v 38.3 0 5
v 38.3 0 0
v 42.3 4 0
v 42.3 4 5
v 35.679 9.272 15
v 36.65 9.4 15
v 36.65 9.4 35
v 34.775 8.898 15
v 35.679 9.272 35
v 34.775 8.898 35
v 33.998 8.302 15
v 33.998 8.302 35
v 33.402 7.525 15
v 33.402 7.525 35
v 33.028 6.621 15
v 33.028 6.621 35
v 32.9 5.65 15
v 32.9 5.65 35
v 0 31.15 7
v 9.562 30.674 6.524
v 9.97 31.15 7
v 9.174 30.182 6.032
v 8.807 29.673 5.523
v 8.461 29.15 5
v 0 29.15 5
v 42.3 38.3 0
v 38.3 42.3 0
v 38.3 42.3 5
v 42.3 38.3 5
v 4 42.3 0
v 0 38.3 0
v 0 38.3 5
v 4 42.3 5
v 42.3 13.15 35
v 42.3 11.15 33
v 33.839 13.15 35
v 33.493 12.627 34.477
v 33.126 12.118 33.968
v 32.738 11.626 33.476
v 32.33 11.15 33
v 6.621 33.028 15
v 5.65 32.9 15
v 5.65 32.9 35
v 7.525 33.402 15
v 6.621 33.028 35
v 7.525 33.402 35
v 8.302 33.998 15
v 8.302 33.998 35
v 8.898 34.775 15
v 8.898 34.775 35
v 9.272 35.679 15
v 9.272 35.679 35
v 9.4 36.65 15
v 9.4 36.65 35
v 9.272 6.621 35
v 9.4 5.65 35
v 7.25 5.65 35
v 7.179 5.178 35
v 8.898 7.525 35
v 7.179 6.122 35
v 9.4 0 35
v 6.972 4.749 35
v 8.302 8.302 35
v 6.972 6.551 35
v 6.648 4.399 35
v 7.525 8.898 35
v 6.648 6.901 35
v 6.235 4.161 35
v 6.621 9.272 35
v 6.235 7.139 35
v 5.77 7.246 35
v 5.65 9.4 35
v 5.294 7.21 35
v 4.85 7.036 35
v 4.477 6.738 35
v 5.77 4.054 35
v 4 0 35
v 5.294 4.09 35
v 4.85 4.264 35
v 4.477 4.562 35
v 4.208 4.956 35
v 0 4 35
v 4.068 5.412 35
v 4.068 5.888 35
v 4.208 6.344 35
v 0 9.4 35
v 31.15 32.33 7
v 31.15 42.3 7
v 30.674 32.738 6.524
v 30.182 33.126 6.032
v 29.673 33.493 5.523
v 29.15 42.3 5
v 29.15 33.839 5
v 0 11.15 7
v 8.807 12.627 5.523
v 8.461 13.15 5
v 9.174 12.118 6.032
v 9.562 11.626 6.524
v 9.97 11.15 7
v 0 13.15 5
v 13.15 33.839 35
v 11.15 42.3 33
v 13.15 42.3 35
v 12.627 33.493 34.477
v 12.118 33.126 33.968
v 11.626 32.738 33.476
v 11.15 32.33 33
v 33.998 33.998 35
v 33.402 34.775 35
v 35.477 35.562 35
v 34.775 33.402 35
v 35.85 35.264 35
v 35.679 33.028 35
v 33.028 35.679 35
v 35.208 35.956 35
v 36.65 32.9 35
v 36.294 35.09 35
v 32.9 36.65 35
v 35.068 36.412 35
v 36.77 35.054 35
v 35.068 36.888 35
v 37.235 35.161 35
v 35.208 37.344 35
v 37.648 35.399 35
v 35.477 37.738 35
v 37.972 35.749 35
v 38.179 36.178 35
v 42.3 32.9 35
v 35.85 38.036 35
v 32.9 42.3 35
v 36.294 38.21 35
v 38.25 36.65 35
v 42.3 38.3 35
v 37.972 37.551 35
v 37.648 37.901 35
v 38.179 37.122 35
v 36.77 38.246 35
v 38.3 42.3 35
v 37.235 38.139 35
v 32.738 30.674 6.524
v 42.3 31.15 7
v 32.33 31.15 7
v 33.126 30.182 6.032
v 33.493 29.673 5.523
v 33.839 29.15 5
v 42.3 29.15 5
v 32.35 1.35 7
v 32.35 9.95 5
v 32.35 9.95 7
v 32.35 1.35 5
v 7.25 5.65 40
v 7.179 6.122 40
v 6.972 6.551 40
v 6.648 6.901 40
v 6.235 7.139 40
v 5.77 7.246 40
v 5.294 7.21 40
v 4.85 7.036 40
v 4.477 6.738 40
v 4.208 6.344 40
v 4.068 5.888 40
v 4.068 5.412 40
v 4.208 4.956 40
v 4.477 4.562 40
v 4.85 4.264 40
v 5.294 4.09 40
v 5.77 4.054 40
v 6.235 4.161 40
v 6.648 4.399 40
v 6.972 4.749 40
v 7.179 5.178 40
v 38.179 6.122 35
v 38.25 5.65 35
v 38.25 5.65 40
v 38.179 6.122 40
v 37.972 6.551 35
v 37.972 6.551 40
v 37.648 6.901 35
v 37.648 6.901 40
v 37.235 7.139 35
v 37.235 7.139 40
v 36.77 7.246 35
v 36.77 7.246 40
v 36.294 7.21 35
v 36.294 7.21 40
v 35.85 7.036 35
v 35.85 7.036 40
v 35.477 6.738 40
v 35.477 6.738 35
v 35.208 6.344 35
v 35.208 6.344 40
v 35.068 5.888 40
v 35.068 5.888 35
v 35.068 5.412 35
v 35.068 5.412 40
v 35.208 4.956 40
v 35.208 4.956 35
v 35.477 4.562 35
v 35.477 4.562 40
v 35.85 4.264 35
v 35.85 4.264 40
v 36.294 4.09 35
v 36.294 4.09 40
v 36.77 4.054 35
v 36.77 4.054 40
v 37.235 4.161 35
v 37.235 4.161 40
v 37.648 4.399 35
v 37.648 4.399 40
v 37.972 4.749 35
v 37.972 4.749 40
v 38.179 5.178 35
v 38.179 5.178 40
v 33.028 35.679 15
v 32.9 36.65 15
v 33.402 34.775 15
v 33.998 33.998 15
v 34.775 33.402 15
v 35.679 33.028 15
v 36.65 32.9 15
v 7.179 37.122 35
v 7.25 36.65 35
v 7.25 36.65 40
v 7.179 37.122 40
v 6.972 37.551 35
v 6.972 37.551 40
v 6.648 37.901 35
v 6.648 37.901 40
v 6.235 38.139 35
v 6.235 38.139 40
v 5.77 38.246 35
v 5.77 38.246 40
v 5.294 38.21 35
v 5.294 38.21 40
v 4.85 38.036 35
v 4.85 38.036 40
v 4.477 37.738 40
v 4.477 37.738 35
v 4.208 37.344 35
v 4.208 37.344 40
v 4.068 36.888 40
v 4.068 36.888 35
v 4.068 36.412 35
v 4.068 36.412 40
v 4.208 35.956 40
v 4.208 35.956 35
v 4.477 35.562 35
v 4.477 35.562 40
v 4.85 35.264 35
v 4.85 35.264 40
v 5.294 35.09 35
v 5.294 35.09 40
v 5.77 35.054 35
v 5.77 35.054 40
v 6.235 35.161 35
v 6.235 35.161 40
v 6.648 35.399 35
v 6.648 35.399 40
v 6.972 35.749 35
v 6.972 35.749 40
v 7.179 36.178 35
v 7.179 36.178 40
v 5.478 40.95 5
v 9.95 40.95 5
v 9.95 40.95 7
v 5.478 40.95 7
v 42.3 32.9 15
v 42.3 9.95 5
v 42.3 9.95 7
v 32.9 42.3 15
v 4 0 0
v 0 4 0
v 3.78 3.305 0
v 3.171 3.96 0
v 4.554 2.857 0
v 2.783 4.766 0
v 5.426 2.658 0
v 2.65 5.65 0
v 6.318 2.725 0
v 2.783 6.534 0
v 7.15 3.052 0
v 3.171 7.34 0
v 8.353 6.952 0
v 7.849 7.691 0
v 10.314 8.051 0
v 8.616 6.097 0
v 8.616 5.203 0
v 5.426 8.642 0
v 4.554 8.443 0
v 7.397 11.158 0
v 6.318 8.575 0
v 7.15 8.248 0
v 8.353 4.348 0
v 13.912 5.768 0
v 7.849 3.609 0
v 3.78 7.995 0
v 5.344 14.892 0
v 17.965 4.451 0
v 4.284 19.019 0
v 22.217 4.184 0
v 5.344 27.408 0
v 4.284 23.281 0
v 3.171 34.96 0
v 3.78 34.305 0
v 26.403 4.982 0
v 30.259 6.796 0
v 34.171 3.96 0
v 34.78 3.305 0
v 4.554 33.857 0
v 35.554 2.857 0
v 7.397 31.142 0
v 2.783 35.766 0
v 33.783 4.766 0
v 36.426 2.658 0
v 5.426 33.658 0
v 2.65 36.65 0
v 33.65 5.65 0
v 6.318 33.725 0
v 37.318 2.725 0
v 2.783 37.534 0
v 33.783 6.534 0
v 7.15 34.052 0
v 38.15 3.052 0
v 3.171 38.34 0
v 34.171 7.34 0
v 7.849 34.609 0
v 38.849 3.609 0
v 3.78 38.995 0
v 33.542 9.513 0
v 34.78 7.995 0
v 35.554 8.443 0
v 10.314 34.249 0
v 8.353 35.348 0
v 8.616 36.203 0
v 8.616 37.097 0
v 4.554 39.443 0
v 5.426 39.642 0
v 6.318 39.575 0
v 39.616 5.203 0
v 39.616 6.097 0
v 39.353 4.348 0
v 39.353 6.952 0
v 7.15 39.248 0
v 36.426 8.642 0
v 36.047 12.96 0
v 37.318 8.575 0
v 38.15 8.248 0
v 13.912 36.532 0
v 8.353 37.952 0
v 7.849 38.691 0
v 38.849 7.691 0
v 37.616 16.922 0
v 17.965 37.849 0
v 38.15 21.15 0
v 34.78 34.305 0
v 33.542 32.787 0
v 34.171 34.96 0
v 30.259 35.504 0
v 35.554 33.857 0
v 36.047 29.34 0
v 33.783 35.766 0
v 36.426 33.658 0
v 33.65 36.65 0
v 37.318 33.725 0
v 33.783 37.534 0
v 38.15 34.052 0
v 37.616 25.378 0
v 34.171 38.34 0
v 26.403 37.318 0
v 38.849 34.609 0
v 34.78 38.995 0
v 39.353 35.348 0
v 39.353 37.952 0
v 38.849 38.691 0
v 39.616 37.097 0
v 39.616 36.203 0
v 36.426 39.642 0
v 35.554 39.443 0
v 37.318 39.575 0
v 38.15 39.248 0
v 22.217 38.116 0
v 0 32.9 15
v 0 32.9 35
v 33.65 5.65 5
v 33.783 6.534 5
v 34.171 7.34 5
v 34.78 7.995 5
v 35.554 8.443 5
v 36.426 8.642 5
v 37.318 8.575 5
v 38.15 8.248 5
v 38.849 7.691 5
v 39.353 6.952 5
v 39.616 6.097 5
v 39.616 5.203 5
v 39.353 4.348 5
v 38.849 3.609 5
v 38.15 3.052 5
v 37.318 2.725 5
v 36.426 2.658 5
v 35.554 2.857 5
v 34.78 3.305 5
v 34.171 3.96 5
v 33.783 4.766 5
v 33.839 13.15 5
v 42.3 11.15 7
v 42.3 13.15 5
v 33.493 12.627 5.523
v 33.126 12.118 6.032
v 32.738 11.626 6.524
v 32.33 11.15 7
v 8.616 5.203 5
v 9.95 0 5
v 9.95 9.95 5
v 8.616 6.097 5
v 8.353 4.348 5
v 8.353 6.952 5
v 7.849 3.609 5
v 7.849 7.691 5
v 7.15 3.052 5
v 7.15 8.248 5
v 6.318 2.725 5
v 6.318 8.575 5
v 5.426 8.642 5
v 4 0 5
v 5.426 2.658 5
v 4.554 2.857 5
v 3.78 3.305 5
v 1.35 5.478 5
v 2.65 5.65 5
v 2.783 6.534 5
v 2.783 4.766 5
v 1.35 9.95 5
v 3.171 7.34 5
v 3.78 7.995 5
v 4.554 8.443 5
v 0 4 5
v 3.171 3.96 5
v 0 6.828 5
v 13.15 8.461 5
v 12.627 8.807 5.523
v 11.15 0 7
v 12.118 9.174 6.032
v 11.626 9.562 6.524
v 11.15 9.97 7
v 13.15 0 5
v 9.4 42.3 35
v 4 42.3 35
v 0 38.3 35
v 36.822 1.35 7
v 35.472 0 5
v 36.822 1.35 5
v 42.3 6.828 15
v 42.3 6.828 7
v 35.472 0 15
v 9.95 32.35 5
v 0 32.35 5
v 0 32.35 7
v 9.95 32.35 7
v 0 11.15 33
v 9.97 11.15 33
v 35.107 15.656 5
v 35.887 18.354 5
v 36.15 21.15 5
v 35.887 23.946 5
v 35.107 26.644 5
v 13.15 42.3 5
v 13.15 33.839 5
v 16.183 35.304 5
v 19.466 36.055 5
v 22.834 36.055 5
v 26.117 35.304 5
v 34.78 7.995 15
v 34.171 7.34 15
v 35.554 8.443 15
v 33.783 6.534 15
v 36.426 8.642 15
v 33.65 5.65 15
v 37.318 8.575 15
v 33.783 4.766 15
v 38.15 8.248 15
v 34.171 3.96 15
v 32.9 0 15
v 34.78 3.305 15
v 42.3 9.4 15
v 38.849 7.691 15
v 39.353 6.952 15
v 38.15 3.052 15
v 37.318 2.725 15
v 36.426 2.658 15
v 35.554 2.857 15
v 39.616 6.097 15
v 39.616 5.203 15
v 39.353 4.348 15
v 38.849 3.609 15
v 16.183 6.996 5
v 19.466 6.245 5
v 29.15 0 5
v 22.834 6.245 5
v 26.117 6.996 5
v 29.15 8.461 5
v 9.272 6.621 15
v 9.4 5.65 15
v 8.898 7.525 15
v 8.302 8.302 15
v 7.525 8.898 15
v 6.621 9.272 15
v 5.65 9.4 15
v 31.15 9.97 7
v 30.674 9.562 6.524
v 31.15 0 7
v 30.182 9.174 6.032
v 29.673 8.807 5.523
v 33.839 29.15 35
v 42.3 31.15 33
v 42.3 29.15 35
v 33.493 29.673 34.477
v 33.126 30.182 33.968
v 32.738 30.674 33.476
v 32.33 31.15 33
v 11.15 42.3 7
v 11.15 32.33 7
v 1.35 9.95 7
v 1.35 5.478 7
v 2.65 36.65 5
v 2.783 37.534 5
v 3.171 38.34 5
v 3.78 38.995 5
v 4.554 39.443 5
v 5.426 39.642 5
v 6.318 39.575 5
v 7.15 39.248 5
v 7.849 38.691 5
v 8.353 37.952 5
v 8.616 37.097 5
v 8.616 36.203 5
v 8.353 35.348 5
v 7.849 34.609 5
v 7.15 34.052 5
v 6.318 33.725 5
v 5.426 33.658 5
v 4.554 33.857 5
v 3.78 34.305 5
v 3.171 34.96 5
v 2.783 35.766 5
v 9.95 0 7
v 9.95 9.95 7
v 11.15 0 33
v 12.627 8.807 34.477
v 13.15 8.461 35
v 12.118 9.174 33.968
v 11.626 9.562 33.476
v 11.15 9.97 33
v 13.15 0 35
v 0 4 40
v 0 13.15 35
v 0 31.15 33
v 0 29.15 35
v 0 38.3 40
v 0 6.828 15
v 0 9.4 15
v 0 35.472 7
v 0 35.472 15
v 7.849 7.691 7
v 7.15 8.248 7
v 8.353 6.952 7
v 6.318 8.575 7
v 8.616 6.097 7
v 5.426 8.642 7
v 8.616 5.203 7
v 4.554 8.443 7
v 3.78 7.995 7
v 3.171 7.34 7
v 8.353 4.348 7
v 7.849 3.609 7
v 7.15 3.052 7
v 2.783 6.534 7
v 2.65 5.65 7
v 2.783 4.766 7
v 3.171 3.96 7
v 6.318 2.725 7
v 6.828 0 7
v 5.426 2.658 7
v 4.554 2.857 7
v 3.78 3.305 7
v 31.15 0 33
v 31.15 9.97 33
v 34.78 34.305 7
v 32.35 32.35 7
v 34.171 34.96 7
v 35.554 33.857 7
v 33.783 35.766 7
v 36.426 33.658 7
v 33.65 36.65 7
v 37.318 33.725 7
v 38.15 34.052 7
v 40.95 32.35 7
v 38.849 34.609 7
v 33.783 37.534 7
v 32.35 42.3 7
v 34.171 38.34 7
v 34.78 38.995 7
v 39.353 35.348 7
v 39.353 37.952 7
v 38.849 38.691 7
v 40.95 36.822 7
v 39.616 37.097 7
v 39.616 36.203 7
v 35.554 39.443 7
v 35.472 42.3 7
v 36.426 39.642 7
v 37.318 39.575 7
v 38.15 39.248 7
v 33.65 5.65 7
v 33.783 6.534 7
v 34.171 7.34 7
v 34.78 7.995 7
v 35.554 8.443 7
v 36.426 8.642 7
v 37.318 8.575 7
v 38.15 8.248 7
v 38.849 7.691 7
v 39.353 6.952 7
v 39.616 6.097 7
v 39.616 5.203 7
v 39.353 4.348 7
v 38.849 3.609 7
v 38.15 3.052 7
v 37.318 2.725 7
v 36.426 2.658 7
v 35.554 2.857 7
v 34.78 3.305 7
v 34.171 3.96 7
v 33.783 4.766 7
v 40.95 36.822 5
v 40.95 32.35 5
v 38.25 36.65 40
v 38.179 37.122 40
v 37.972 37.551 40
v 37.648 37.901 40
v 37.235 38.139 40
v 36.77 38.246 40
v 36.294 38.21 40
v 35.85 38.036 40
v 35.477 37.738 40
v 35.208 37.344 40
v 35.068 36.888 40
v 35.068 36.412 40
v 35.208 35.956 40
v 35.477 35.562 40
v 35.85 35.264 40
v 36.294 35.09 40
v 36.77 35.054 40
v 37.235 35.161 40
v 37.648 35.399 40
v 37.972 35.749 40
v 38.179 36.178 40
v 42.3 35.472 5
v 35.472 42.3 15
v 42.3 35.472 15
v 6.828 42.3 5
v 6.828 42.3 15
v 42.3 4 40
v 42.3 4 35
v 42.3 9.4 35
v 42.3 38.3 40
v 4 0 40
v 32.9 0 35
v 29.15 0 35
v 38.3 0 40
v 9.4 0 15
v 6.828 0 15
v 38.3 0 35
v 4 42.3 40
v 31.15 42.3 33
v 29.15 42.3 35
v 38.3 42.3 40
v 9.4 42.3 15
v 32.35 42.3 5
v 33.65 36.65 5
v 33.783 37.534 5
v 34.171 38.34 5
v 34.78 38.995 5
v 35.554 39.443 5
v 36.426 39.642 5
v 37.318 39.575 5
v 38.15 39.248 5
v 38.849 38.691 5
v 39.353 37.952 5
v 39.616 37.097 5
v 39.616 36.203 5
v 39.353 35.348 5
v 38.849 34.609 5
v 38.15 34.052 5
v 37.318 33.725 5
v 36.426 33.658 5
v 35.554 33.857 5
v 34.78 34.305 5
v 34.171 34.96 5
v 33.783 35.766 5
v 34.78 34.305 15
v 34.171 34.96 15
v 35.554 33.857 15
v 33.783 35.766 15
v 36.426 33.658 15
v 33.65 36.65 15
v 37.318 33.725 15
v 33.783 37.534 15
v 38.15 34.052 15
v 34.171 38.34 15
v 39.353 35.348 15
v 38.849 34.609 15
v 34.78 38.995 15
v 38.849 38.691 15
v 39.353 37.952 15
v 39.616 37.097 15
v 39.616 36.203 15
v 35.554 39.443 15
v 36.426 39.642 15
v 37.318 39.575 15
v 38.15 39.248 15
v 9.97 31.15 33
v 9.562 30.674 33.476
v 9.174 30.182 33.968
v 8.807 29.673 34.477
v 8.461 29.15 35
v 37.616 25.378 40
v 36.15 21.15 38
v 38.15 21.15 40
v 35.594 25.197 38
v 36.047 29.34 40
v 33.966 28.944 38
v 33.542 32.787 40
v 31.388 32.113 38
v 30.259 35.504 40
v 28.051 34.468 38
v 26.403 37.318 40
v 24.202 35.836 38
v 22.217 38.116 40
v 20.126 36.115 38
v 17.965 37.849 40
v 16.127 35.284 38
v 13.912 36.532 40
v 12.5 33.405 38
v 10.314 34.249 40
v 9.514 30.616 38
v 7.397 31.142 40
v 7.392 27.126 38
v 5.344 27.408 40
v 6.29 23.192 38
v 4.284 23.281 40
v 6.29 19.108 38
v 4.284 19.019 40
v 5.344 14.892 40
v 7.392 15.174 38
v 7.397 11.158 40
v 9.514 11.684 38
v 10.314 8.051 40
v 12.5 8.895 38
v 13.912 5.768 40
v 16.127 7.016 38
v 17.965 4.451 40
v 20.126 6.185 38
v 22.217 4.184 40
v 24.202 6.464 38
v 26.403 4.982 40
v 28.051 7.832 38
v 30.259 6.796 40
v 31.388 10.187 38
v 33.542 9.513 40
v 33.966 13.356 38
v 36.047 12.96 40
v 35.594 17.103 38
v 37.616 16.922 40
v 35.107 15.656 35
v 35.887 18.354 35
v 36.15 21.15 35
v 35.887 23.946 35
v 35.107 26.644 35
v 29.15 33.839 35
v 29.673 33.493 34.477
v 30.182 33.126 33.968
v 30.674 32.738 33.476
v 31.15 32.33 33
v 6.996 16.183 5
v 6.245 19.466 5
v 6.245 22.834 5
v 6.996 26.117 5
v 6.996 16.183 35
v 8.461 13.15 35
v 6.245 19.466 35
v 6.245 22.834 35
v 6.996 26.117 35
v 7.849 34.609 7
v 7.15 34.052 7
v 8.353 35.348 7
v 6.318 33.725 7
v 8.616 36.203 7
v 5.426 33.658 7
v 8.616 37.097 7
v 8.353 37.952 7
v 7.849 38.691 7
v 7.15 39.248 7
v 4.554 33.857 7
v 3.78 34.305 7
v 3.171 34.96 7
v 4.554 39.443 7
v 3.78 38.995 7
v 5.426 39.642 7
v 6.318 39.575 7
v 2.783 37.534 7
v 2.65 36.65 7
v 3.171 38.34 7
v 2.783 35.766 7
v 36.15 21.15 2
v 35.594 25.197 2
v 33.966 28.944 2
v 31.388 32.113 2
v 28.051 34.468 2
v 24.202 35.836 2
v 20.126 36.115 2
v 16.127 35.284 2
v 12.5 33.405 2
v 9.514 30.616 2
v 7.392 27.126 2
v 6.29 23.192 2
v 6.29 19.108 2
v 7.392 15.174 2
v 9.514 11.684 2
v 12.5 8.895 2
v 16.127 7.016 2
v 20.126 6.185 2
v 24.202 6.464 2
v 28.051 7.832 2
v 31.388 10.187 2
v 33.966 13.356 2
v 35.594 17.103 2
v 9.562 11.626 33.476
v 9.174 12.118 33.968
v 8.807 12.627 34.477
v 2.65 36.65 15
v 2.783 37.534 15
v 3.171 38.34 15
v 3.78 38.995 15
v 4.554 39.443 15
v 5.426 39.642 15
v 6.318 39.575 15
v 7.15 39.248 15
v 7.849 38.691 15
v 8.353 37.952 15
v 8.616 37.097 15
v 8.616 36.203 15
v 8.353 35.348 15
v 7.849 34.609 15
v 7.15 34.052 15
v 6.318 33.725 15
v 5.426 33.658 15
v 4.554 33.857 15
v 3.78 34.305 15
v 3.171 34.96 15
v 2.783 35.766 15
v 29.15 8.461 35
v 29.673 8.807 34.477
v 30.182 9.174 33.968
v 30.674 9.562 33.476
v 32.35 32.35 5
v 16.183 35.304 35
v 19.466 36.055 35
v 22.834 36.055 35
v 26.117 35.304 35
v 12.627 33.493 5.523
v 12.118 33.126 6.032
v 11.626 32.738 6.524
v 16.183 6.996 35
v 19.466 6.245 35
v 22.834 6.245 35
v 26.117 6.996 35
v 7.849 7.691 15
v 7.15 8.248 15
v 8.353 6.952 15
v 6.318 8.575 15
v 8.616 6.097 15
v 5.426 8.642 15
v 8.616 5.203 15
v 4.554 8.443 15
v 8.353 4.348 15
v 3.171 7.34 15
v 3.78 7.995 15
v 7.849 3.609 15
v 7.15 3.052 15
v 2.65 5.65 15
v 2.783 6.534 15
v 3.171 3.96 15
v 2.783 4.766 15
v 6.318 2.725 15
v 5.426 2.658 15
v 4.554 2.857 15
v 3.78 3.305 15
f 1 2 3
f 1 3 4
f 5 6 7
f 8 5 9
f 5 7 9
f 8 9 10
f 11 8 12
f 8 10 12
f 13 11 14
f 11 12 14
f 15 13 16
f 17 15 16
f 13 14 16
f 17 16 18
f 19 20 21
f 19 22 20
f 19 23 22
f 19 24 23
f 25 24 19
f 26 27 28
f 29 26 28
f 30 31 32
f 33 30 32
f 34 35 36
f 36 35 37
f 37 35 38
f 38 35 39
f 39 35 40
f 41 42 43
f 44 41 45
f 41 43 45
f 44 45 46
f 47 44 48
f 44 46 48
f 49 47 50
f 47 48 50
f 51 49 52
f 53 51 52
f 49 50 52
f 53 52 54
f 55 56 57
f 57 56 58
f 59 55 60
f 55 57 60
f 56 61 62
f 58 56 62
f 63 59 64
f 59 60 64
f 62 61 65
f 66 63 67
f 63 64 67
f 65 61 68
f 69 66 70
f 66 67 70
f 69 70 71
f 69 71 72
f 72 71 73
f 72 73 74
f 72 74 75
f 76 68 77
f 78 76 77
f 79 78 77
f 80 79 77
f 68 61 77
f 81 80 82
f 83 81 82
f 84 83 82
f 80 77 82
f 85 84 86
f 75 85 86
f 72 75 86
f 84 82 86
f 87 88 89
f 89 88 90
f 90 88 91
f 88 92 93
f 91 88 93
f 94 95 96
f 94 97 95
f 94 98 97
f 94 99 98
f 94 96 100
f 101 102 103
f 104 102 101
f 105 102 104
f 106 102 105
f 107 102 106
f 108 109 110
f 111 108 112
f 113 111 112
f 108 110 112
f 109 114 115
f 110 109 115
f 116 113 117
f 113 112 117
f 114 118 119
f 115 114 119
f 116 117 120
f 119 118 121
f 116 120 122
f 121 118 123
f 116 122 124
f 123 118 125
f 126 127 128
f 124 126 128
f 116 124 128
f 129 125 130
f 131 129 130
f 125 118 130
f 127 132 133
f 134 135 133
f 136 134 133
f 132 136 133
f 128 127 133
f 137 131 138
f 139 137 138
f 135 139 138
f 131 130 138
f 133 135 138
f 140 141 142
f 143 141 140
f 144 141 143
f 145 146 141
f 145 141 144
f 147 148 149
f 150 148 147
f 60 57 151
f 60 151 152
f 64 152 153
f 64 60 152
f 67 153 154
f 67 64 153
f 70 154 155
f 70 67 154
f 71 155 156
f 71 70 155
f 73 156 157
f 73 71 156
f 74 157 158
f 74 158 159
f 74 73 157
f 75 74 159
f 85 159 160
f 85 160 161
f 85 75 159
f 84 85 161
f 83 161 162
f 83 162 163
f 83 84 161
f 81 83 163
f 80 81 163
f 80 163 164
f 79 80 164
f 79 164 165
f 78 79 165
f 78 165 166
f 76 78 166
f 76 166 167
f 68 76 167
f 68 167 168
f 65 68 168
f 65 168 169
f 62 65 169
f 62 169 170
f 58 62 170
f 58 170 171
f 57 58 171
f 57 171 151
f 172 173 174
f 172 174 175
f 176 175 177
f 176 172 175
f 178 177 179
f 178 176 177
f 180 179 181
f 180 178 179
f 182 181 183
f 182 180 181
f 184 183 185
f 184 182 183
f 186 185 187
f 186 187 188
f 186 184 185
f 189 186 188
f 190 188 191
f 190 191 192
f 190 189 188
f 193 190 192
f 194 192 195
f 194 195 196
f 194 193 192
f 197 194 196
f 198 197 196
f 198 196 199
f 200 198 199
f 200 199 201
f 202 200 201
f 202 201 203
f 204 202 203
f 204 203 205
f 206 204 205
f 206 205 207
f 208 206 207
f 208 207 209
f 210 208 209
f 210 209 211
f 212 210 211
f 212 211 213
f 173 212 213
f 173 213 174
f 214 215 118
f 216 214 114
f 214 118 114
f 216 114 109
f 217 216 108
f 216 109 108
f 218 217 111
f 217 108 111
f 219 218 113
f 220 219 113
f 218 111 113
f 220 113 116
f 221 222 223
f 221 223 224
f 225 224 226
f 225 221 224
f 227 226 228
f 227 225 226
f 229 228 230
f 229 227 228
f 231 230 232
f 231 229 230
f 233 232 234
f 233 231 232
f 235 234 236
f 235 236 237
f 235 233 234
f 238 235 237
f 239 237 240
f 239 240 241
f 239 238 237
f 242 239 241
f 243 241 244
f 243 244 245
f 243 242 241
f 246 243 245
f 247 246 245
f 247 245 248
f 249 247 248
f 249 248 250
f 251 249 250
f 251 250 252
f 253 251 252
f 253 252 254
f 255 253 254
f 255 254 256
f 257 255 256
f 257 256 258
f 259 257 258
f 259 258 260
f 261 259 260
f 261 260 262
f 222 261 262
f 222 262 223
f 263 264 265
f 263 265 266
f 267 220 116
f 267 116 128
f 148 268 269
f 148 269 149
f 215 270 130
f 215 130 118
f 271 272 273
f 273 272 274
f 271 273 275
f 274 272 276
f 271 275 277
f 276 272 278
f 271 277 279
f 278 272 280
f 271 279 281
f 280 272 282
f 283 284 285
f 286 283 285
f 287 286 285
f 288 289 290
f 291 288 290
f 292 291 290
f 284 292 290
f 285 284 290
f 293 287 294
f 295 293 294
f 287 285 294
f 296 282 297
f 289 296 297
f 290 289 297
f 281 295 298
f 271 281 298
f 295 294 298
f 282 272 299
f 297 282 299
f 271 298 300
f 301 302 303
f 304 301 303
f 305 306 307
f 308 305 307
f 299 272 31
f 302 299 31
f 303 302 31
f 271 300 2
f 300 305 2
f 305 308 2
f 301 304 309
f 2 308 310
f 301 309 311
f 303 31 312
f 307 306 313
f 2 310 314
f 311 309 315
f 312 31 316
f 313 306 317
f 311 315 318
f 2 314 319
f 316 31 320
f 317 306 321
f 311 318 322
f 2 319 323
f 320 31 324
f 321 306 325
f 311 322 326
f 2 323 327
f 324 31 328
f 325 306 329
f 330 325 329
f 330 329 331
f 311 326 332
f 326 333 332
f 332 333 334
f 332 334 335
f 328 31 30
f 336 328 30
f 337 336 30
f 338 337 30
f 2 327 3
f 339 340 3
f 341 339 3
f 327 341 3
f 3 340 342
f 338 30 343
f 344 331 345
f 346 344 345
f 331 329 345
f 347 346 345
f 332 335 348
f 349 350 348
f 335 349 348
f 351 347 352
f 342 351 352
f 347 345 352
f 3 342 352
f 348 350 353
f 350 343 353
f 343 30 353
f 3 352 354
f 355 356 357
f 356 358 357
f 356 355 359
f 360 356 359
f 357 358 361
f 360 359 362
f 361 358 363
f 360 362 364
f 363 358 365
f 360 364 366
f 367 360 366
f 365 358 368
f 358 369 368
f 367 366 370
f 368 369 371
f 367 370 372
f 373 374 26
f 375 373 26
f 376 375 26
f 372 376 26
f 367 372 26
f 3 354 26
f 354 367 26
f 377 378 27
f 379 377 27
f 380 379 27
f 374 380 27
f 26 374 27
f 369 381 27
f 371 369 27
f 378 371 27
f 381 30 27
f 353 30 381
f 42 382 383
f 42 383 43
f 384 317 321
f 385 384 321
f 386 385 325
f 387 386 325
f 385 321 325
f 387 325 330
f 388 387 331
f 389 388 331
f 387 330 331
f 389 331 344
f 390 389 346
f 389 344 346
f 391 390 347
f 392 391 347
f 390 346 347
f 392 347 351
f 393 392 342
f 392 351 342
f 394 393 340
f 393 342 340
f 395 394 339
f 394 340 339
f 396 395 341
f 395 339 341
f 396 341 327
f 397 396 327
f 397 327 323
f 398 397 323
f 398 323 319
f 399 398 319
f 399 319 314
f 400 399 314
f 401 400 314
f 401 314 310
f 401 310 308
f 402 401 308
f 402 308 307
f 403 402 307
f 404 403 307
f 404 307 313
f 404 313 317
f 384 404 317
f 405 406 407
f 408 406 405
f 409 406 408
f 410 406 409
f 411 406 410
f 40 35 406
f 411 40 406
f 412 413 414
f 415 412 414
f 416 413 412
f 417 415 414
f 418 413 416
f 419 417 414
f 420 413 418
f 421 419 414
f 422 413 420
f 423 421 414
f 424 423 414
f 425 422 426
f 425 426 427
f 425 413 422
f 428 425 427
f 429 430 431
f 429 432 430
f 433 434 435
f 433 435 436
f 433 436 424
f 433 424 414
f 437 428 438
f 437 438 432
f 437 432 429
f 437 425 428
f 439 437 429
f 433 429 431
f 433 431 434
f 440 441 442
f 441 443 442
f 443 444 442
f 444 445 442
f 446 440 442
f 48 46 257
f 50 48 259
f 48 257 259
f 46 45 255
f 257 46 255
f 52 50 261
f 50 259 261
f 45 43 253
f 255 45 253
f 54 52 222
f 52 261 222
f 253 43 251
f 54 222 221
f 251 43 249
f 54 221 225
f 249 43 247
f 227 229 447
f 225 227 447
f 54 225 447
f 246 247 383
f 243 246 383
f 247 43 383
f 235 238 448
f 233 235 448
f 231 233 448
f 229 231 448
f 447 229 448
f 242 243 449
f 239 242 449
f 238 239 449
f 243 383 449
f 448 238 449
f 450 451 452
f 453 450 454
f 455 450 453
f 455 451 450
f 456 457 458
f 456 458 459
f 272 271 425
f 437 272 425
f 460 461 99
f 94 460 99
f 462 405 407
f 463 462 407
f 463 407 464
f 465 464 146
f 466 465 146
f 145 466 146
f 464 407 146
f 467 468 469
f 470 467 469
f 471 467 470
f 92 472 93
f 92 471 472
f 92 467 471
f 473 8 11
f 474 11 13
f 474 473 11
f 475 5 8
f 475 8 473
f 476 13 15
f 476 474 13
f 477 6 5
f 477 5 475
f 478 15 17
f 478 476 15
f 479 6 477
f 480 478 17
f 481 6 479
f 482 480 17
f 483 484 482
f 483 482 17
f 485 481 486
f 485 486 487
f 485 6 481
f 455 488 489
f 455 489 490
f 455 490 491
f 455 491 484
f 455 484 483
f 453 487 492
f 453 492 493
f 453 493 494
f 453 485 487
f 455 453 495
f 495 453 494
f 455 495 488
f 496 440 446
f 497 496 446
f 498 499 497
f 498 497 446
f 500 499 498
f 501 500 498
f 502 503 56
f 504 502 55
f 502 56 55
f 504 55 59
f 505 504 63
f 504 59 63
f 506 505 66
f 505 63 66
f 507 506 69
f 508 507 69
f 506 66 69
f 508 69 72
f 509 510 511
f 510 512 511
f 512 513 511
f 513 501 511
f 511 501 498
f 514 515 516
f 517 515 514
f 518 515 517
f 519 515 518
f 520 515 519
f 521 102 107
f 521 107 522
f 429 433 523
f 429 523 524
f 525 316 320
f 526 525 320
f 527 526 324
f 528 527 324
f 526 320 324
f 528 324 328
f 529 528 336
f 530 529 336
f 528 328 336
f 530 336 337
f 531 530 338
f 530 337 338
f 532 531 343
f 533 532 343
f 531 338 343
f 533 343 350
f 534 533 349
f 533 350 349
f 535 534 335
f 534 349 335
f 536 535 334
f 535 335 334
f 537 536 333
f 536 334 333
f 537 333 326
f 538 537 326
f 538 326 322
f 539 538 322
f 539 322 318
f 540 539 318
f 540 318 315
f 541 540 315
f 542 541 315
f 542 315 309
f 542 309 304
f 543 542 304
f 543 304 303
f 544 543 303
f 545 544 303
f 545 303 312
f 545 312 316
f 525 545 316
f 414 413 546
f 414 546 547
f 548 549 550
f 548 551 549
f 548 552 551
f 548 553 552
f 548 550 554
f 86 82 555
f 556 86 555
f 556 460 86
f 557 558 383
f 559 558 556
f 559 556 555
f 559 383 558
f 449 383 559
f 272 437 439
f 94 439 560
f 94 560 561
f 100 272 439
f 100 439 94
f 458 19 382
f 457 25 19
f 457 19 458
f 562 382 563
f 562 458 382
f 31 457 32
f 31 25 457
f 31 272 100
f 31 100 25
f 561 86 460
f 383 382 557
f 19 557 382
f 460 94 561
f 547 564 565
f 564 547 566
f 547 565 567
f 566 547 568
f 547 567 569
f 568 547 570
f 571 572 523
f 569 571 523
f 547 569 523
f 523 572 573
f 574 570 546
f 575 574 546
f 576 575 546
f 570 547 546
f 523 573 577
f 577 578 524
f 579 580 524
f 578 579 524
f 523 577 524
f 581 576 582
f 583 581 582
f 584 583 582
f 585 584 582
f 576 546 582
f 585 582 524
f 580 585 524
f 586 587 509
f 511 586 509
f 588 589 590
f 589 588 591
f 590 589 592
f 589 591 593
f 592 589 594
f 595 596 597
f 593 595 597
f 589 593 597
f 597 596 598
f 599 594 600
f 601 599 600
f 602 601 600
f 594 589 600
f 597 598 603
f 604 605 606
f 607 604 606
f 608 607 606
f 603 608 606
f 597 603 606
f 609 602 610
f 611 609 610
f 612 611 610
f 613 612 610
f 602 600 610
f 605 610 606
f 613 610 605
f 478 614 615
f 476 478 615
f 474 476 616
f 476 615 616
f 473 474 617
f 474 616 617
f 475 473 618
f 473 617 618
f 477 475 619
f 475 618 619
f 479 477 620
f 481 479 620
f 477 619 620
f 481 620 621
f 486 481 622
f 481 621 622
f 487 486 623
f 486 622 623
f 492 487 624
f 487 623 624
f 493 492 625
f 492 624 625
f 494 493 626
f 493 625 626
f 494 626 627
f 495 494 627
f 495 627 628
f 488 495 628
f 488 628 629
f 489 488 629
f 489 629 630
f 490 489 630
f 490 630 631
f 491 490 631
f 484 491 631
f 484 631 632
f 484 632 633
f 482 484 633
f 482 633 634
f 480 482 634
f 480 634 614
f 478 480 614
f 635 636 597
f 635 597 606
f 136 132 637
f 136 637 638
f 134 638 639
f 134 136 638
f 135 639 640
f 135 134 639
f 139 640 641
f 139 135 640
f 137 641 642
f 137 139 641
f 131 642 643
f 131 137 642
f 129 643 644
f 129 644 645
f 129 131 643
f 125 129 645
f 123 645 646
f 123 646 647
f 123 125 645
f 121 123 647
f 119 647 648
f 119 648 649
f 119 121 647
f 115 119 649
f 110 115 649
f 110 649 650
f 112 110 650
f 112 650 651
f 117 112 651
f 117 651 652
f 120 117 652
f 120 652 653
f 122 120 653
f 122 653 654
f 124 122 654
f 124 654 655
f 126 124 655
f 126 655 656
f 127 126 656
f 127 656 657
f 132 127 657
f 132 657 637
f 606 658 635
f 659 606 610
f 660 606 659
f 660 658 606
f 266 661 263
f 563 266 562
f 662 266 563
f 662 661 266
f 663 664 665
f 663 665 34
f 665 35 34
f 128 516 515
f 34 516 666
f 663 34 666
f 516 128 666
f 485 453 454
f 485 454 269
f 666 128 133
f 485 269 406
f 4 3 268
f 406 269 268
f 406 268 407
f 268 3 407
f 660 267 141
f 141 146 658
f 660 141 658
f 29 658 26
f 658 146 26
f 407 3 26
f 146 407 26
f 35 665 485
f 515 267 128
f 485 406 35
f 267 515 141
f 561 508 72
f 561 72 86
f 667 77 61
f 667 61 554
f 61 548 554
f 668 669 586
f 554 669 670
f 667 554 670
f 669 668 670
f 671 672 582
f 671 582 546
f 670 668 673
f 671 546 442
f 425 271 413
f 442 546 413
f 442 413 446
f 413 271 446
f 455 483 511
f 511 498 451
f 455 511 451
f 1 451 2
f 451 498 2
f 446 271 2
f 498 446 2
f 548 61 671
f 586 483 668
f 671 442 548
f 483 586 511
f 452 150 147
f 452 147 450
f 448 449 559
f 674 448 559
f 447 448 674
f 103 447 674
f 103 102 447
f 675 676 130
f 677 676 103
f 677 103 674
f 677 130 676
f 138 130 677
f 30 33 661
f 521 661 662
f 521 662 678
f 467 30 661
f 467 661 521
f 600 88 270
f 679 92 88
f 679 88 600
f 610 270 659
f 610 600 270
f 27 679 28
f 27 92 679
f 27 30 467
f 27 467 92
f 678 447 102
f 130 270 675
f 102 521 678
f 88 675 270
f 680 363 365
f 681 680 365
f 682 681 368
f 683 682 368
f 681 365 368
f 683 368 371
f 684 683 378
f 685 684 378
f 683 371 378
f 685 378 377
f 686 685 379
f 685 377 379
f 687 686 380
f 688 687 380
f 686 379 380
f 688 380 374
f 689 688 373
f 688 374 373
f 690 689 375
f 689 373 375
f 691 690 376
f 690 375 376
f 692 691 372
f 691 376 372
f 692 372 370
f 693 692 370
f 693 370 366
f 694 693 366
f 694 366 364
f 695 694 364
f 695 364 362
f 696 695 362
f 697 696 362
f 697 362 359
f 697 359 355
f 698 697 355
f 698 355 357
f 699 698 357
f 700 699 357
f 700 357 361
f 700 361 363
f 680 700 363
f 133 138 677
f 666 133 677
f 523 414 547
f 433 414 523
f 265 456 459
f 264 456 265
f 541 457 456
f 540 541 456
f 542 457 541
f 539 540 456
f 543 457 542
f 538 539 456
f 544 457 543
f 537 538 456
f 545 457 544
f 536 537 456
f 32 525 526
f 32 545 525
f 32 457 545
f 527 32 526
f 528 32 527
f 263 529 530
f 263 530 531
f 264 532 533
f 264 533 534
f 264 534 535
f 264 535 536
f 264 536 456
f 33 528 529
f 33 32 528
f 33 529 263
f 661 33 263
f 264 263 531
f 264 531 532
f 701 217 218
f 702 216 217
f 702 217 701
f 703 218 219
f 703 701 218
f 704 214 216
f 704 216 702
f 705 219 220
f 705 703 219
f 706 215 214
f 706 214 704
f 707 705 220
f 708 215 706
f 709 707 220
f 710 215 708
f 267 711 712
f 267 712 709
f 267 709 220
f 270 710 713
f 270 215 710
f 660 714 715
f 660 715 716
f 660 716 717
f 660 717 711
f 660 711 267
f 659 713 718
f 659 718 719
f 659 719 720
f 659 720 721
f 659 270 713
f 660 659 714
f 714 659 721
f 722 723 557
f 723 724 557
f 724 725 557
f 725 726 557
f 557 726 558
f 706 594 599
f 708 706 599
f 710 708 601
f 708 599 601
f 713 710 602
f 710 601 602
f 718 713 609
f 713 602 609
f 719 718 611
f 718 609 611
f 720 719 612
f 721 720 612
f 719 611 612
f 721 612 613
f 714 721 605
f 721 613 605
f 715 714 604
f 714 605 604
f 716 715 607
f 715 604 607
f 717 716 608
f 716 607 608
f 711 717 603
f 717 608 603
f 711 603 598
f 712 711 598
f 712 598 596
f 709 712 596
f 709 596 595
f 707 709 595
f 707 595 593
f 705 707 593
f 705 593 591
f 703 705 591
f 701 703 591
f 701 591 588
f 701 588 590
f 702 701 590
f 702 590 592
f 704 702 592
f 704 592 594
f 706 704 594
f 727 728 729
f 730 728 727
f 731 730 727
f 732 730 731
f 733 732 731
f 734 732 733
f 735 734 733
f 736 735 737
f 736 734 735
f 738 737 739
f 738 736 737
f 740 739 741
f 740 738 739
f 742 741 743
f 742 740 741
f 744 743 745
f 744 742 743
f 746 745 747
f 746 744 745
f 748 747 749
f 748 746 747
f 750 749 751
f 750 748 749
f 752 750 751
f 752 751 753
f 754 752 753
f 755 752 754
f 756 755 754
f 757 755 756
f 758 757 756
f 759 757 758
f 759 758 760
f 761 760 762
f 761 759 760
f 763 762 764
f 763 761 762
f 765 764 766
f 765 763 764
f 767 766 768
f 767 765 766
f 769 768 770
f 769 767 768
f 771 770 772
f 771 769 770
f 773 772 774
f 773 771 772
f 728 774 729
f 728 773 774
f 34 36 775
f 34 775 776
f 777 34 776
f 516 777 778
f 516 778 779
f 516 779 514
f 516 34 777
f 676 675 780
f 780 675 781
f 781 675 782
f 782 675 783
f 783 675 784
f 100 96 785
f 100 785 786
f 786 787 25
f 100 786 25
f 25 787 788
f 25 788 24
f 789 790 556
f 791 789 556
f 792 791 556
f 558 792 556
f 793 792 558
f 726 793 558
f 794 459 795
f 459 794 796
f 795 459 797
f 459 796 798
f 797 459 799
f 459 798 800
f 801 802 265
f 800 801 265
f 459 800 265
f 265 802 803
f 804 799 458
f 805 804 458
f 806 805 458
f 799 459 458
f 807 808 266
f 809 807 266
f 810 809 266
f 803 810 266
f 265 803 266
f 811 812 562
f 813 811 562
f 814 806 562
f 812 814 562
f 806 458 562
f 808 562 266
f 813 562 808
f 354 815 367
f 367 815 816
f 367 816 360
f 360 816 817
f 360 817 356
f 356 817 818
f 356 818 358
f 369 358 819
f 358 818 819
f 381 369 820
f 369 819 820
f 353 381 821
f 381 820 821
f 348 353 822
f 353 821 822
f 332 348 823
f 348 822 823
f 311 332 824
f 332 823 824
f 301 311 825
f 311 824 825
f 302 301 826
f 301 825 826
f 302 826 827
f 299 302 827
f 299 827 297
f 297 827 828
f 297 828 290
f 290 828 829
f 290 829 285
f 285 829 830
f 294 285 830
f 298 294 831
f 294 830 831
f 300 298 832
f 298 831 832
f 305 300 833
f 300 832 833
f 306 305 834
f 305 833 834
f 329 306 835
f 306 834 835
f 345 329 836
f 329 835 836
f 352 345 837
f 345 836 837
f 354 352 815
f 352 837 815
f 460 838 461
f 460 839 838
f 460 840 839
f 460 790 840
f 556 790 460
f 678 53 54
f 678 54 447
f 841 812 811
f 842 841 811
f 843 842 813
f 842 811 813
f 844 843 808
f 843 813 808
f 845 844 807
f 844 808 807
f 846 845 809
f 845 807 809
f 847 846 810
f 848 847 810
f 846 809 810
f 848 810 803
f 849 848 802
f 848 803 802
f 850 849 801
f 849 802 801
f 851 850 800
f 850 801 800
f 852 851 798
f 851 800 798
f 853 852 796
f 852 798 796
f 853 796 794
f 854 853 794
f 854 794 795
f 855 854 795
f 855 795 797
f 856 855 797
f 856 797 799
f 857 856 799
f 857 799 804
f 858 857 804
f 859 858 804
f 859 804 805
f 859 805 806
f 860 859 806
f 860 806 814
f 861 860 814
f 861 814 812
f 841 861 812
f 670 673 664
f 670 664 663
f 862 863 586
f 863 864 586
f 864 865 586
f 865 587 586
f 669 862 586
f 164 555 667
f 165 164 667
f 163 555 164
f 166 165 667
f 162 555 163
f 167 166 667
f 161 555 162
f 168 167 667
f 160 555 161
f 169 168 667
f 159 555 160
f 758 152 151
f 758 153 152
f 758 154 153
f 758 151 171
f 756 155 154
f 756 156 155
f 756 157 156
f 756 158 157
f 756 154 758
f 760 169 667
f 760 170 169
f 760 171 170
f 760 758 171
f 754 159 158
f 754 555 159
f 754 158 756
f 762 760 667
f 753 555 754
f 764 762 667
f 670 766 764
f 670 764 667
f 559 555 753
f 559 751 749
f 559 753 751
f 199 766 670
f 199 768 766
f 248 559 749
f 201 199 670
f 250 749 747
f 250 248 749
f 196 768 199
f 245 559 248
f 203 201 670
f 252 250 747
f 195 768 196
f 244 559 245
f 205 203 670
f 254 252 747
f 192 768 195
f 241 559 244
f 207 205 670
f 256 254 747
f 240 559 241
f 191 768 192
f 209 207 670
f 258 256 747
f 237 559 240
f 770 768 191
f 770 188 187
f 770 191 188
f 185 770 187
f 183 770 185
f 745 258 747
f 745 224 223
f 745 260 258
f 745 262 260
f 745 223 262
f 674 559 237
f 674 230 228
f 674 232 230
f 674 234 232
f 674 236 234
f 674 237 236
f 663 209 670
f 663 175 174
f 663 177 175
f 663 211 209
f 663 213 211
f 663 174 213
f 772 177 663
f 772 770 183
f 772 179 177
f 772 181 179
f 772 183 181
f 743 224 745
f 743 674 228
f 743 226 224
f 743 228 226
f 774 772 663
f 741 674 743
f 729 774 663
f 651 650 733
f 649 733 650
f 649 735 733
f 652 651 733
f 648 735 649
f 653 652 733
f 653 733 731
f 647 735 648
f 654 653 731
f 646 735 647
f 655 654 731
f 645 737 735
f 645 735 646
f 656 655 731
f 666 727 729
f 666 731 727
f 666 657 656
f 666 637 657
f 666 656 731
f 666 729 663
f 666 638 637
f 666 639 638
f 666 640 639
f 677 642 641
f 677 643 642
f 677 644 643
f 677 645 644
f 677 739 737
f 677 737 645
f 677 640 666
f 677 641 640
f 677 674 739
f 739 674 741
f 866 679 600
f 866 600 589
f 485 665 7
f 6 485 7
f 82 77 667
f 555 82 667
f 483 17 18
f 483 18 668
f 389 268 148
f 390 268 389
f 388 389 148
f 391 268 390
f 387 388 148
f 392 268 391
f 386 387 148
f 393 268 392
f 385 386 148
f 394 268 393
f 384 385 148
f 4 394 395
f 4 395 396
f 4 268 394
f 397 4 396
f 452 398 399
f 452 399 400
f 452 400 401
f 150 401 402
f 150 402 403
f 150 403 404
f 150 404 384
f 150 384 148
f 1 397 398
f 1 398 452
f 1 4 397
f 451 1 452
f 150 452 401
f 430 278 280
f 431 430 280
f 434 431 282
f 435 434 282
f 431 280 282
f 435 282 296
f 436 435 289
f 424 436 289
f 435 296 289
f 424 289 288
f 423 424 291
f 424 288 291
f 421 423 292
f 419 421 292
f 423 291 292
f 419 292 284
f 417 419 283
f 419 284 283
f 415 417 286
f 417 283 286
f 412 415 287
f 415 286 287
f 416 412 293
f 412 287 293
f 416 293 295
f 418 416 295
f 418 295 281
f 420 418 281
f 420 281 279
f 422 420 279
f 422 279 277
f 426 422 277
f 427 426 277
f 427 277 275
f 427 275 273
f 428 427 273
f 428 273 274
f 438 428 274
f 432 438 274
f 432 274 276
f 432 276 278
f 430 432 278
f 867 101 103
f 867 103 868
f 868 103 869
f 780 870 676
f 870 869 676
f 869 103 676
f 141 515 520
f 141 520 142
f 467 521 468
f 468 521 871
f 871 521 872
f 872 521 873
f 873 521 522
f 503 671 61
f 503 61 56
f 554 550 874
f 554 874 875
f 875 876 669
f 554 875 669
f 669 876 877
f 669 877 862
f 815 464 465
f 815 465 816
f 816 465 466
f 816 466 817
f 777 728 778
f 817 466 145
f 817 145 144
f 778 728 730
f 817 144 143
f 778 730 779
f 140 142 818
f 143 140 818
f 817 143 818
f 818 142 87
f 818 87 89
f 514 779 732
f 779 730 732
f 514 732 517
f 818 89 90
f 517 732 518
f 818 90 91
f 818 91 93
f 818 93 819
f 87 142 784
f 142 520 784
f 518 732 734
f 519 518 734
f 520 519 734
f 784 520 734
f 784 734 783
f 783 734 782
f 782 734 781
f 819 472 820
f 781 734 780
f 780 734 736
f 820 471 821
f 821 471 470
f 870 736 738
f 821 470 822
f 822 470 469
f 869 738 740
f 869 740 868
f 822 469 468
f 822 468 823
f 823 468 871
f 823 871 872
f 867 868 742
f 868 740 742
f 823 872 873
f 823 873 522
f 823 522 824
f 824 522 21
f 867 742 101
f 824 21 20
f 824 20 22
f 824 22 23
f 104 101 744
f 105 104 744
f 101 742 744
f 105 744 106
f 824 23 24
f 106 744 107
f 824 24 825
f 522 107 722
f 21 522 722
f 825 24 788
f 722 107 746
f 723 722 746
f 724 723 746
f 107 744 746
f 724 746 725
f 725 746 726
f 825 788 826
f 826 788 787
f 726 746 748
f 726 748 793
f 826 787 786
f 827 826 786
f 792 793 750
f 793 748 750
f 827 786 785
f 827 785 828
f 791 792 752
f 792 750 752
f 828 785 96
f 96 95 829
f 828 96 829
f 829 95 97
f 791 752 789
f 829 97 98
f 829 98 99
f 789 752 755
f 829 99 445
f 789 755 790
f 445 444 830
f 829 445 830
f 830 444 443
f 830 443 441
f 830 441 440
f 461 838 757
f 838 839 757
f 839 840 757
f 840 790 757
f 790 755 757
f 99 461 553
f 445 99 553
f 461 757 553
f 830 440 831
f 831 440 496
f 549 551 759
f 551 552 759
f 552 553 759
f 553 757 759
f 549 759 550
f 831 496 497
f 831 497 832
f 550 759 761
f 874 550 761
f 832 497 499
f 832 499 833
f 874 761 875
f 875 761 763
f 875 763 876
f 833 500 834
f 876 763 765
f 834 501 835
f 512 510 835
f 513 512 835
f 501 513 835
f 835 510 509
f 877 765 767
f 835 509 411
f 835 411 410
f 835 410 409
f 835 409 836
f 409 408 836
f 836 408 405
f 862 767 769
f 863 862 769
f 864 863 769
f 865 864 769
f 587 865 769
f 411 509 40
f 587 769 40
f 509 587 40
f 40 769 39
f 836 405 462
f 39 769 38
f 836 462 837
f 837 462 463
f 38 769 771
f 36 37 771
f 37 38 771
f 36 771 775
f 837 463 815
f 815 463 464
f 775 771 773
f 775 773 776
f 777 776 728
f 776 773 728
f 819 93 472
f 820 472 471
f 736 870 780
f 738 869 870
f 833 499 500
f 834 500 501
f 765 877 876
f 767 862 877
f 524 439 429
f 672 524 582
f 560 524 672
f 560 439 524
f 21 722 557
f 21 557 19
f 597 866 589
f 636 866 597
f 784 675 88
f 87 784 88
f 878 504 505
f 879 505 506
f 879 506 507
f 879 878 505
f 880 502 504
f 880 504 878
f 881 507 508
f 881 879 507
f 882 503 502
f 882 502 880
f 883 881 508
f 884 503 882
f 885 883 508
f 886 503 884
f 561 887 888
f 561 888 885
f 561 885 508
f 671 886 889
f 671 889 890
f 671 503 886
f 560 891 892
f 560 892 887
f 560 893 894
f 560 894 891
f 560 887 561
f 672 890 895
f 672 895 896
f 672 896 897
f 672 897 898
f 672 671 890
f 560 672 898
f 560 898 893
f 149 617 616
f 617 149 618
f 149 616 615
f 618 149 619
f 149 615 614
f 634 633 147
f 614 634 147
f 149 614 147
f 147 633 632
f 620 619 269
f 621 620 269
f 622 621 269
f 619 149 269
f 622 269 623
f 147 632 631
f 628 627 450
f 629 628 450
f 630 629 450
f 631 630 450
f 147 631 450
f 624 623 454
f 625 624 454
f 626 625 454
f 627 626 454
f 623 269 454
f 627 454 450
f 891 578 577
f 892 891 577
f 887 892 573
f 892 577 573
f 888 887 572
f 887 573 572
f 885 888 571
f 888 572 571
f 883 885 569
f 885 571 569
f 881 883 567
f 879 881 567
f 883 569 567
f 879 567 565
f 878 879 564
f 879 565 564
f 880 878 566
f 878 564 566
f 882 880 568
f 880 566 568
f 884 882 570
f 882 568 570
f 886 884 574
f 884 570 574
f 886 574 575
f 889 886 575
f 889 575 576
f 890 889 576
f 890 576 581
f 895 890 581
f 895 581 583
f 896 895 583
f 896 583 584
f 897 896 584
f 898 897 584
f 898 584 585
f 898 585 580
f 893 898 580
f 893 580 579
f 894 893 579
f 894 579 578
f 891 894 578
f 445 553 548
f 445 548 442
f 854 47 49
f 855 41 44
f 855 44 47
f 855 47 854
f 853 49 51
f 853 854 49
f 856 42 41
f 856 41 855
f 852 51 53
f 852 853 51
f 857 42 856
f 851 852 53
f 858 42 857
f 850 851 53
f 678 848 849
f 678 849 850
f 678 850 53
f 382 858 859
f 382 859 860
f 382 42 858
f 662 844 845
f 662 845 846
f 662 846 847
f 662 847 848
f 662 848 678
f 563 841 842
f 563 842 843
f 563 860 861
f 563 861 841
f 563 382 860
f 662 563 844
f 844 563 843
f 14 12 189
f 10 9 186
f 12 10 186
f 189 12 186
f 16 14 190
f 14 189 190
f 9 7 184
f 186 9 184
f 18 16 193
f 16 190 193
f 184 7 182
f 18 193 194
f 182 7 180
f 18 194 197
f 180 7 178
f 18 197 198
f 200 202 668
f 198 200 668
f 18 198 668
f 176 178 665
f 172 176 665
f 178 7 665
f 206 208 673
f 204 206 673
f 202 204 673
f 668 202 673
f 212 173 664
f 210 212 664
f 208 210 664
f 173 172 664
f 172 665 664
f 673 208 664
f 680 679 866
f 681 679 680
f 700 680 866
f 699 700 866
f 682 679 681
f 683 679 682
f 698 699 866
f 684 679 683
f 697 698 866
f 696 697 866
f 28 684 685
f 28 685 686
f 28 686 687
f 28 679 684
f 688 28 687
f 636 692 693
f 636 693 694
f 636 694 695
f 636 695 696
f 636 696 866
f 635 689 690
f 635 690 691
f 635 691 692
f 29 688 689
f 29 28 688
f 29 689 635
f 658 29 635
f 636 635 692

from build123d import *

# Parameters (mm, degrees)
SKETCH1_W           = 42.3
SKETCH1_H           = 42.3
SKETCH1_R           = 1.6
BOSS_EXTRUDE1_DEPTH = 40
SKETCH2_R           = 15
CUT_EXTRUDE1_DEPTH  = 40
CHAMFER1_SIZE       = 4
CHAMFER2_SIZE       = 2
SKETCH3_W           = 30
SKETCH3_H           = 20
CUT_EXTRUDE2_DEPTH  = 72.962351268
SKETCH4_W           = 20
SKETCH4_H           = 30
CUT_EXTRUDE3_DEPTH  = 72.962351268
CHAMFER3_SIZE       = 2
SKETCH5_W           = 30
SKETCH5_H           = 15
CUT_EXTRUDE5_DEPTH  = 2
CIRPATTERN1_COUNT   = 4
CUT_EXTRUDE6_DEPTH  = 2
CIRPATTERN2_COUNT   = 4
CUT_EXTRUDE7_DEPTH  = 20
CIRPATTERN3_COUNT   = 4
SKETCH10_R          = 3
CUT_EXTRUDE8_DEPTH  = 20


with BuildPart() as part:
    # Sketch1 → Boss-Extrude1 (new body)
    with BuildSketch(Plane.XY):
        with Locations((21.15, 21.15)):
            Rectangle(SKETCH1_W, SKETCH1_H)
        with Locations((5.65, 36.65)):
            Circle(SKETCH1_R, mode=Mode.SUBTRACT)
        with Locations((5.65, 5.65)):
            Circle(SKETCH1_R, mode=Mode.SUBTRACT)
        with Locations((36.65, 5.65)):
            Circle(SKETCH1_R, mode=Mode.SUBTRACT)
        with Locations((36.65, 36.65)):
            Circle(SKETCH1_R, mode=Mode.SUBTRACT)
    extrude(amount=BOSS_EXTRUDE1_DEPTH)

    # Sketch2 → Cut-Extrude1 (cut)
    with BuildSketch(Plane.XY.offset(40)):
        with Locations((21.15, 21.15)):
            Circle(SKETCH2_R)
    extrude(amount=-CUT_EXTRUDE1_DEPTH, mode=Mode.SUBTRACT)

    # Chamfer1
    chamfer1_edges = [part.edges().sort_by_distance(p)[0] for p in [
        (0, 0, 20),
        (0, 42.3, 20),
        (42.3, 42.3, 20),
        (42.3, 0, 20),
    ]]
    chamfer(chamfer1_edges, length=CHAMFER1_SIZE)

    # Chamfer2
    chamfer2_edges = [part.edges().sort_by_distance(p)[0] for p in [
        (6.15, 21.15, 0),
        (6.15, 21.15, 40),
    ]]
    chamfer(chamfer2_edges, length=CHAMFER2_SIZE)

    # Sketch3 → Cut-Extrude2 (cut, through all)
    with BuildSketch(Plane(origin=(42.3, 0, 0), x_dir=(0, 0, -1), z_dir=(1, 0, 0))):
        with Locations((-20, 21.15)):
            Rectangle(SKETCH3_W, SKETCH3_H)
    extrude(amount=-CUT_EXTRUDE2_DEPTH, mode=Mode.SUBTRACT)

    # Sketch4 → Cut-Extrude3 (cut, through all)
    with BuildSketch(Plane(origin=(0, 42.3, 0), x_dir=(1, 0, 0), z_dir=(0, 1, 0))):
        with Locations((21.15, -20)):
            Rectangle(SKETCH4_W, SKETCH4_H)
    extrude(amount=-CUT_EXTRUDE3_DEPTH, mode=Mode.SUBTRACT)

    # Chamfer3
    chamfer3_edges = [part.edges().sort_by_distance(p)[0] for p in [
        (31.15, 37.315169944, 5),
        (31.15, 4.984830056, 5),
        (31.15, 4.984830056, 35),
        (31.15, 37.315169944, 35),
        (11.15, 4.984830056, 35),
        (11.15, 37.315169944, 35),
        (11.15, 4.984830056, 5),
        (11.15, 37.315169944, 5),
        (4.984830056, 31.15, 5),
        (37.315169944, 31.15, 5),
        (37.315169944, 11.15, 5),
        (4.984830056, 11.15, 5),
        (4.984830056, 11.15, 35),
        (37.315169944, 11.15, 35),
        (4.984830056, 31.15, 35),
        (37.315169944, 31.15, 35),
    ]]
    chamfer(chamfer3_edges, length=CHAMFER3_SIZE)

    # Sketch5 → Cut-Extrude5 (cut)
    with BuildSketch(Plane(origin=(-19.15, 19.15, 0), x_dir=(0, 0, 1), z_dir=(-0.7071067811865469, 0.7071067811865481, 0))):
        with Locations((20, 29.910616844)):
            Rectangle(SKETCH5_W, SKETCH5_H)
    cut_extrude5 = extrude(amount=-CUT_EXTRUDE5_DEPTH, mode=Mode.SUBTRACT)

    # CirPattern1: Cut-Extrude5 ×4 about axis
    cirpattern1_axis = Axis((21.15, 21.15, 0), (0, 0, 1))
    for i in range(1, CIRPATTERN1_COUNT):
        add(cut_extrude5.rotate(cirpattern1_axis, i * 360 / CIRPATTERN1_COUNT), mode=Mode.SUBTRACT)

    # Sketch8 → Cut-Extrude6 (cut)
    with BuildSketch(Plane.XY.offset(5)):
        Polygon((36.821572875, 40.95), (32.35, 40.95), (32.35, 32.35), (40.95, 32.35), (40.95, 36.821572875), align=None)
        Polygon((35.471572875, 42.3), (36.821572875, 40.95), (39.65, 40.95), (38.3, 42.3), align=None)
        Polygon((32.35, 42.3), (32.35, 40.95), (36.821572875, 40.95), (35.471572875, 42.3), align=None)
        Polygon((39.65, 40.95), (36.821572875, 40.95), (40.95, 36.821572875), (40.95, 39.65), align=None)
        Polygon((38.3, 42.3), (39.65, 40.95), (40.95, 40.95), (40.95, 42.3), align=None)
    cut_extrude6 = extrude(amount=CUT_EXTRUDE6_DEPTH, mode=Mode.SUBTRACT)

    # CirPattern2: Cut-Extrude6 ×4 about axis
    cirpattern2_axis = Axis((21.15, 21.15, 0), (0, 0, 1))
    for i in range(1, CIRPATTERN2_COUNT):
        add(cut_extrude6.rotate(cirpattern2_axis, i * 360 / CIRPATTERN2_COUNT), mode=Mode.SUBTRACT)

    # Sketch9 → Cut-Extrude7 (cut)
    with BuildSketch(Plane(origin=(0, 0, 35), x_dir=(-1, 0, 0), z_dir=(0, 0, -1))):
        with BuildLine():
            Line((-36.65, 32.9), (-42.3, 32.9))
            Line((-42.3, 32.9), (-42.3, 38.3))
            Line((-42.3, 38.3), (-38.3, 42.3))
            Line((-38.3, 42.3), (-32.9, 42.3))
            Line((-32.9, 42.3), (-32.9, 36.65))
            ThreePointArc((-32.9, 36.65), (-33.998349571, 33.998349571), (-36.65, 32.9))
        make_face()
    cut_extrude7 = extrude(amount=CUT_EXTRUDE7_DEPTH, mode=Mode.SUBTRACT)

    # CirPattern3: Cut-Extrude7 ×4 about axis
    cirpattern3_axis = Axis((21.15, 21.15, 0), (0, 0, 1))
    for i in range(1, CIRPATTERN3_COUNT):
        add(cut_extrude7.rotate(cirpattern3_axis, i * 360 / CIRPATTERN3_COUNT), mode=Mode.SUBTRACT)

    # Sketch10 → Cut-Extrude8 (cut)
    with BuildSketch(Plane(origin=(0, 0, 0), x_dir=(-1, 0, 0), z_dir=(0, 0, -1))):
        with Locations((-36.65, 36.65)):
            Circle(SKETCH10_R)
        with Locations((-5.65, 36.65)):
            Circle(SKETCH10_R)
        with Locations((-5.65, 5.65)):
            Circle(SKETCH10_R)
        with Locations((-36.65, 5.65)):
            Circle(SKETCH10_R)
    extrude(amount=-CUT_EXTRUDE8_DEPTH, mode=Mode.SUBTRACT)


solid = part.part
